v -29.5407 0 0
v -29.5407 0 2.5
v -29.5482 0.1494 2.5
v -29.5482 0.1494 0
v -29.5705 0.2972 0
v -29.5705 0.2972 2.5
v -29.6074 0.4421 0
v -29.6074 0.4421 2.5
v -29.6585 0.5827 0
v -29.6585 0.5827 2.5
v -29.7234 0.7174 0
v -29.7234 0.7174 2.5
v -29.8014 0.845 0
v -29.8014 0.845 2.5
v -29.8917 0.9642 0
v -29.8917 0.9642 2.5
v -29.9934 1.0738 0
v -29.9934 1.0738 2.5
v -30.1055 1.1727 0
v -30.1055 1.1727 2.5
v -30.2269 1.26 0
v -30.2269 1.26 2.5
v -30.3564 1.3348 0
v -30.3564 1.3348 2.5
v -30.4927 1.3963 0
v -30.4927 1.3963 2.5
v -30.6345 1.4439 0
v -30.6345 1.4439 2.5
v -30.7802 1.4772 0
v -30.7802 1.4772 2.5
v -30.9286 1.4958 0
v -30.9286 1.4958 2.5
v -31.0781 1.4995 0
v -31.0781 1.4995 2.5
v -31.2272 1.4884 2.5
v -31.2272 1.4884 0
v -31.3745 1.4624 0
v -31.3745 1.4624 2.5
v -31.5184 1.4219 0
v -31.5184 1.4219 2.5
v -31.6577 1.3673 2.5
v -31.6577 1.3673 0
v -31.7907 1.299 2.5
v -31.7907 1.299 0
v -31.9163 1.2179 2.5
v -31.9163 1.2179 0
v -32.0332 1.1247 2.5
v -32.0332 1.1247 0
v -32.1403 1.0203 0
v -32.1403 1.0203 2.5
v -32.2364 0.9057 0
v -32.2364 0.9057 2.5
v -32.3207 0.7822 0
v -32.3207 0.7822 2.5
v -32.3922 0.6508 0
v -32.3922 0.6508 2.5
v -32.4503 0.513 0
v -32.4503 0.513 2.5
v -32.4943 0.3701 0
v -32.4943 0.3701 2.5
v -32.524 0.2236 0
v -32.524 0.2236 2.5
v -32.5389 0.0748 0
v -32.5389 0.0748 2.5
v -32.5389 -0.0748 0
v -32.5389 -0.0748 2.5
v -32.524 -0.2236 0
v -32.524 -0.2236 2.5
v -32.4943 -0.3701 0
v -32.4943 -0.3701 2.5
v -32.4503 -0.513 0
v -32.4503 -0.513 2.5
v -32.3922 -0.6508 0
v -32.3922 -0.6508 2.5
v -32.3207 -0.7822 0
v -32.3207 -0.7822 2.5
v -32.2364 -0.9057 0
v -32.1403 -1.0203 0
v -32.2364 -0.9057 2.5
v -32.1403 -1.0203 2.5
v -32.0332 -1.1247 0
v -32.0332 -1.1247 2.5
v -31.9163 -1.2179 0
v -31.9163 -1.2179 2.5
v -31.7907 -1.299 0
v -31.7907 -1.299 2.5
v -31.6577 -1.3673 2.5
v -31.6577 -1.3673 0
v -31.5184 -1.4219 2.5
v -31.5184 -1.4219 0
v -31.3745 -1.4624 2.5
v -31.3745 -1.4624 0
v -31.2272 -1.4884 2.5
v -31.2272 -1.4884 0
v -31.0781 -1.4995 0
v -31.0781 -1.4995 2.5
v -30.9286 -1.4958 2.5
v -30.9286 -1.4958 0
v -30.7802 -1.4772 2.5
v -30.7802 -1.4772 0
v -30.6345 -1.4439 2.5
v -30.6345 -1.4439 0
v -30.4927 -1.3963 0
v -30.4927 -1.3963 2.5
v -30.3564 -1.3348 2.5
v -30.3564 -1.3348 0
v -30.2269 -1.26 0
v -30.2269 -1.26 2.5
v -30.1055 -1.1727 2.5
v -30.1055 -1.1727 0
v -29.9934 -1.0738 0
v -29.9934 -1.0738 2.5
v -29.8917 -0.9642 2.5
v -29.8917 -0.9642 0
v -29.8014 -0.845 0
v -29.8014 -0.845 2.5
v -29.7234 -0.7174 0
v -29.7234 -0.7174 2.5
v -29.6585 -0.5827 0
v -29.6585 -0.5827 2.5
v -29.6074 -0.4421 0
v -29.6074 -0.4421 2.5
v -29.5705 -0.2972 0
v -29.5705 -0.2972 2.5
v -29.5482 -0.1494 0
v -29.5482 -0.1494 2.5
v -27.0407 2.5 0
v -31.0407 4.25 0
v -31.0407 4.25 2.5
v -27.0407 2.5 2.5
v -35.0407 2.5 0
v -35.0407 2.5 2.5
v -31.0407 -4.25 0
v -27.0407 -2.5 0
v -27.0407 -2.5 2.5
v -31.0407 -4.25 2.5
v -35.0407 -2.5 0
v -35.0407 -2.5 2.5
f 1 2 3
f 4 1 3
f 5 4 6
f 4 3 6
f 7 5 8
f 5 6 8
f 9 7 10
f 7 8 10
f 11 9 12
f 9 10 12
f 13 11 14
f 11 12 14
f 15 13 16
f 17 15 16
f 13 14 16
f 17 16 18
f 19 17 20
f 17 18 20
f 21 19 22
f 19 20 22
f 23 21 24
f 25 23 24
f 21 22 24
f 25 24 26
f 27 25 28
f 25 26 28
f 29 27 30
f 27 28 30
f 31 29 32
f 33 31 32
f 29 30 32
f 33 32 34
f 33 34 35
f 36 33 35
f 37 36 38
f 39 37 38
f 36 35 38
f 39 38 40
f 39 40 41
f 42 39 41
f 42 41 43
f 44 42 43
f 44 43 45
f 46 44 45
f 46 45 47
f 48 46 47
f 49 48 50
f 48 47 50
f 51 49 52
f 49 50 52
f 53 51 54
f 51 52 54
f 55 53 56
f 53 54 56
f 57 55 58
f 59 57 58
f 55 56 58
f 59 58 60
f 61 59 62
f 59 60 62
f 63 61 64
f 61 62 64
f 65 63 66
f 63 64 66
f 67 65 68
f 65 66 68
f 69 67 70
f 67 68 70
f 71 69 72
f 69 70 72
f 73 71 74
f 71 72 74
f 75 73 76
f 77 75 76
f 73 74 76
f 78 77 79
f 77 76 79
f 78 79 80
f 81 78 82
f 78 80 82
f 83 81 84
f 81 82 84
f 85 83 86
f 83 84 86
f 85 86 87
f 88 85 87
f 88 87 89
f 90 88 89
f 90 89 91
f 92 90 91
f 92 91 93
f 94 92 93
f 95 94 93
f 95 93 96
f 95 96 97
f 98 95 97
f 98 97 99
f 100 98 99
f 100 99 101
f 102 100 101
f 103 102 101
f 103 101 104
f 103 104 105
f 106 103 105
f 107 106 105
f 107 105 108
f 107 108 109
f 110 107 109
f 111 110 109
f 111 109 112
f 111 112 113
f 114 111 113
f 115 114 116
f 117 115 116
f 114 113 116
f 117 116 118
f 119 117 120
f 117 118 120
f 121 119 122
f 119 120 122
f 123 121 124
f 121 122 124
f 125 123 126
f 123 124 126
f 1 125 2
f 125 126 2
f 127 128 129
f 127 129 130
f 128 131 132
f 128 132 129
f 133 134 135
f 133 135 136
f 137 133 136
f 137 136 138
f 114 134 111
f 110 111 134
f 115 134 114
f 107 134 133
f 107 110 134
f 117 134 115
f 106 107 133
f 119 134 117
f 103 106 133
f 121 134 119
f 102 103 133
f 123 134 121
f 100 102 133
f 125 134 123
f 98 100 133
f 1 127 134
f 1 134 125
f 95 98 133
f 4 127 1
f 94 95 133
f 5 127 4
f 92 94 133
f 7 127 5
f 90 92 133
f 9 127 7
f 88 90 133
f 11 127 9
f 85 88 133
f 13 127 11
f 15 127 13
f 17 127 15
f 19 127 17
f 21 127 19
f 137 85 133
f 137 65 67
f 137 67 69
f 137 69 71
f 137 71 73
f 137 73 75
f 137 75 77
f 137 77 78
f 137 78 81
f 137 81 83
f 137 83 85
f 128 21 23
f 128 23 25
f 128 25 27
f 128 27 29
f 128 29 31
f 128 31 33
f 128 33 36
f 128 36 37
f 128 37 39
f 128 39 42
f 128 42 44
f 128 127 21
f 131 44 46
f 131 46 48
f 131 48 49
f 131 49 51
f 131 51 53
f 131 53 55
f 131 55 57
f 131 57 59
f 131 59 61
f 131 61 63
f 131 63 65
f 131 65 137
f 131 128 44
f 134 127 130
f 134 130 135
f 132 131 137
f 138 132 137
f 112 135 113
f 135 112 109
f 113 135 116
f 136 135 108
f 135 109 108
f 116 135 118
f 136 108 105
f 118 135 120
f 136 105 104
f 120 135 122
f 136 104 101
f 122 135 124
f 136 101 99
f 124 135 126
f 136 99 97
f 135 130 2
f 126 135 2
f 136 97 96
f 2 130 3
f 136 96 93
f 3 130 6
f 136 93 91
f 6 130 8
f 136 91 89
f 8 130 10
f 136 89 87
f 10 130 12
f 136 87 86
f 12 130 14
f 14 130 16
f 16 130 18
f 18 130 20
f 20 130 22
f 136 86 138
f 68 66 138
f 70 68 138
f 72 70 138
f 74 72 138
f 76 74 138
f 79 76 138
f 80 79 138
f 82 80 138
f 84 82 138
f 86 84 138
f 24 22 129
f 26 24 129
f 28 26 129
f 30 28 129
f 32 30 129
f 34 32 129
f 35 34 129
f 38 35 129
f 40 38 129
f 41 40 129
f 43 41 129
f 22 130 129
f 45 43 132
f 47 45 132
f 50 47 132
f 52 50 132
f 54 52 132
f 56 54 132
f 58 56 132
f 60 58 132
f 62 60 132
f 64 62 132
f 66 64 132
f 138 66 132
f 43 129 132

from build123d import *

# Parameters (mm, degrees)
SALIENTE_EXTRUIR1_DEPTH = 2.5
CROQUIS2_R              = 1.5
CORTAR_EXTRUIR2_DEPTH   = 2.5


with BuildPart() as part:
    # Croquis1 → Saliente-Extruir1 (new body)
    with BuildSketch(Plane.XY):
        Polygon((-35.040719462, 0), (-35.040719462, 2.5), (-31.040719462, 4.25), (-27.040719462, 2.5), (-27.040719462, -2.5), (-31.040719462, -4.25), (-35.040719462, -2.5), align=None)
    extrude(amount=SALIENTE_EXTRUIR1_DEPTH)

    # Croquis2 → Cortar-Extruir2 (cut)
    with BuildSketch(Plane.XY.offset(2.5)):
        with Locations((-31.040719462, 0)):
            Circle(CROQUIS2_R)
    extrude(amount=-CORTAR_EXTRUIR2_DEPTH, mode=Mode.SUBTRACT)


solid = part.part
